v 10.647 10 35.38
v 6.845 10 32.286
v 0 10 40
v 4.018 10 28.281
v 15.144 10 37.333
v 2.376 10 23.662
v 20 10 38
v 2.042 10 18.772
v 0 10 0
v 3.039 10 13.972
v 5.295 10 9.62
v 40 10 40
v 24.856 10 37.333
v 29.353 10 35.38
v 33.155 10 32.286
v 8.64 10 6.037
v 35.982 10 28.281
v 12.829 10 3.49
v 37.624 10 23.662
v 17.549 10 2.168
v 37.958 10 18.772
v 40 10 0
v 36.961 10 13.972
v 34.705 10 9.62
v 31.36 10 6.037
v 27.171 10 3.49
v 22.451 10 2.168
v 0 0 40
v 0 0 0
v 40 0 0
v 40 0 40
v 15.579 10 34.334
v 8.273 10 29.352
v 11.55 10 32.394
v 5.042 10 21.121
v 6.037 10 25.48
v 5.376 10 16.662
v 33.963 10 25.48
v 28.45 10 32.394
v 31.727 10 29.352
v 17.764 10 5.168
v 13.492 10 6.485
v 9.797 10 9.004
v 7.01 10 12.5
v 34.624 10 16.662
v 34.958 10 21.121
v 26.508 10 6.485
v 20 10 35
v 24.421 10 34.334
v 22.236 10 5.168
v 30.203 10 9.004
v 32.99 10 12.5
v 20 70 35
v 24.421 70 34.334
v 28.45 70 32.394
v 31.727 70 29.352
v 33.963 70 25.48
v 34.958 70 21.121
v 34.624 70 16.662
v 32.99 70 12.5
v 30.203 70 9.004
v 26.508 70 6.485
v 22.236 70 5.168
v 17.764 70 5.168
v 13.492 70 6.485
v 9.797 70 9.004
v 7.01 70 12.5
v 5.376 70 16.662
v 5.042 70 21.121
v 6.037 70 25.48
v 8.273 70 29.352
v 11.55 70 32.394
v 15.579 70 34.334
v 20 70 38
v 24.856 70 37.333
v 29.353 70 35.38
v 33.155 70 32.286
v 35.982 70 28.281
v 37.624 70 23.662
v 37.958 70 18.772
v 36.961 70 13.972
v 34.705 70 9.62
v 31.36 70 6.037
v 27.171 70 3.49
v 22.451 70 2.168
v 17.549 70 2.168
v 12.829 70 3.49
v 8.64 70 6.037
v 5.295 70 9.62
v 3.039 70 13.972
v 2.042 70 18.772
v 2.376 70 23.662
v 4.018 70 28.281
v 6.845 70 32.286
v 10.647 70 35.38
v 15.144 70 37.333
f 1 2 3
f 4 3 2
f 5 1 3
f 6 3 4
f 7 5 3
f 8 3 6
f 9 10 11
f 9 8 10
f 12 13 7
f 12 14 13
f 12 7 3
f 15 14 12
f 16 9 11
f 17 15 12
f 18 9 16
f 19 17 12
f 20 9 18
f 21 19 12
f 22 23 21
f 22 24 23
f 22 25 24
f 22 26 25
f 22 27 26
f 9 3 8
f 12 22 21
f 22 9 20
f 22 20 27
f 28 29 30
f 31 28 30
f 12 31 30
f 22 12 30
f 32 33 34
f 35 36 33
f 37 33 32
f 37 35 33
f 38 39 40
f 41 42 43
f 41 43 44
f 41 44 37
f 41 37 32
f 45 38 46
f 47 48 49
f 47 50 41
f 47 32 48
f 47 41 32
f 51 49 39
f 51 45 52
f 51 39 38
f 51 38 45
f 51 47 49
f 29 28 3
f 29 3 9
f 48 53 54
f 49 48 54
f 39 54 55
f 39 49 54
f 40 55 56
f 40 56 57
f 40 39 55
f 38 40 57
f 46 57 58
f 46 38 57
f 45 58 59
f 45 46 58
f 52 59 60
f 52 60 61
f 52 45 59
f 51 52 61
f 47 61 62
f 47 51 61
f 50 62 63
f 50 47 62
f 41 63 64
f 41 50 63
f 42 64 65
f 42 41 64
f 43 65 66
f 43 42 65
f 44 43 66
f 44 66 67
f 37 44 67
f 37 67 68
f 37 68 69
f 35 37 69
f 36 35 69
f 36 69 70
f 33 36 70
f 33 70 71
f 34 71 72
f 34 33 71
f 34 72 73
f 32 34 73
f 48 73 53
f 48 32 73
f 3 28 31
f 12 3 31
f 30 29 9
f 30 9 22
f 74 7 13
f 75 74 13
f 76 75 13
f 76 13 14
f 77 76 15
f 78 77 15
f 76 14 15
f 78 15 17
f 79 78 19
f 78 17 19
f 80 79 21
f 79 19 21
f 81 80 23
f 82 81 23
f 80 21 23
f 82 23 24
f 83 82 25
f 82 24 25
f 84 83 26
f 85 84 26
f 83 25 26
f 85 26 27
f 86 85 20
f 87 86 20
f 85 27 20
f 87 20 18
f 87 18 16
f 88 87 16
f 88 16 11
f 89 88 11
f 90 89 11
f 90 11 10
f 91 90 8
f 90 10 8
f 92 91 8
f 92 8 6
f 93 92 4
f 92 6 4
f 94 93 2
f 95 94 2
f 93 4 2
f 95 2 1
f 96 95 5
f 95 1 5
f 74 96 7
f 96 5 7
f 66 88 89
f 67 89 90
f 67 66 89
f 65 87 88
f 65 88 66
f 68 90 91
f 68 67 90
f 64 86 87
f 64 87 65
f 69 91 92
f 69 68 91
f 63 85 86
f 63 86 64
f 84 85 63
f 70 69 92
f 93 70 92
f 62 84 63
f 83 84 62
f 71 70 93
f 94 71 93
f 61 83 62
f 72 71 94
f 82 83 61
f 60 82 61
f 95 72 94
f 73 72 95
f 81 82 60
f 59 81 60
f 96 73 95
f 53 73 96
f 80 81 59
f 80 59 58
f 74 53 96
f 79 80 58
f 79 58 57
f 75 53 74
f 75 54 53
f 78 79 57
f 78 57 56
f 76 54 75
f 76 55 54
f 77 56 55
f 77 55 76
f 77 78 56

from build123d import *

# Parameters (mm, degrees)
SKETCH1_W           = 40
SKETCH1_H           = 40
BOSS_EXTRUDE1_DEPTH = 10
SKETCH2_R           = 18
SKETCH2_R_2         = 15
BOSS_EXTRUDE2_DEPTH = 60


with BuildPart() as part:
    # Sketch1 → Boss-Extrude1 (new body)
    with BuildSketch(Plane(origin=(0, 0, 0), x_dir=(1, 0, 0), z_dir=(0, 1, 0))):
        with Locations((20, -20)):
            Rectangle(SKETCH1_W, SKETCH1_H)
    extrude(amount=BOSS_EXTRUDE1_DEPTH)

    # Sketch2 → Boss-Extrude2 (add)
    with BuildSketch(Plane(origin=(0, 10, 0), x_dir=(1, 0, 0), z_dir=(0, 1, 0))):
        with Locations(Location((20, -20, 0), (0, 0, 270))):
            Circle(SKETCH2_R)
        with Locations(Location((20, -20, 0), (0, 0, 270))):
            Circle(SKETCH2_R_2, mode=Mode.SUBTRACT)
    extrude(amount=BOSS_EXTRUDE2_DEPTH)


solid = part.part
